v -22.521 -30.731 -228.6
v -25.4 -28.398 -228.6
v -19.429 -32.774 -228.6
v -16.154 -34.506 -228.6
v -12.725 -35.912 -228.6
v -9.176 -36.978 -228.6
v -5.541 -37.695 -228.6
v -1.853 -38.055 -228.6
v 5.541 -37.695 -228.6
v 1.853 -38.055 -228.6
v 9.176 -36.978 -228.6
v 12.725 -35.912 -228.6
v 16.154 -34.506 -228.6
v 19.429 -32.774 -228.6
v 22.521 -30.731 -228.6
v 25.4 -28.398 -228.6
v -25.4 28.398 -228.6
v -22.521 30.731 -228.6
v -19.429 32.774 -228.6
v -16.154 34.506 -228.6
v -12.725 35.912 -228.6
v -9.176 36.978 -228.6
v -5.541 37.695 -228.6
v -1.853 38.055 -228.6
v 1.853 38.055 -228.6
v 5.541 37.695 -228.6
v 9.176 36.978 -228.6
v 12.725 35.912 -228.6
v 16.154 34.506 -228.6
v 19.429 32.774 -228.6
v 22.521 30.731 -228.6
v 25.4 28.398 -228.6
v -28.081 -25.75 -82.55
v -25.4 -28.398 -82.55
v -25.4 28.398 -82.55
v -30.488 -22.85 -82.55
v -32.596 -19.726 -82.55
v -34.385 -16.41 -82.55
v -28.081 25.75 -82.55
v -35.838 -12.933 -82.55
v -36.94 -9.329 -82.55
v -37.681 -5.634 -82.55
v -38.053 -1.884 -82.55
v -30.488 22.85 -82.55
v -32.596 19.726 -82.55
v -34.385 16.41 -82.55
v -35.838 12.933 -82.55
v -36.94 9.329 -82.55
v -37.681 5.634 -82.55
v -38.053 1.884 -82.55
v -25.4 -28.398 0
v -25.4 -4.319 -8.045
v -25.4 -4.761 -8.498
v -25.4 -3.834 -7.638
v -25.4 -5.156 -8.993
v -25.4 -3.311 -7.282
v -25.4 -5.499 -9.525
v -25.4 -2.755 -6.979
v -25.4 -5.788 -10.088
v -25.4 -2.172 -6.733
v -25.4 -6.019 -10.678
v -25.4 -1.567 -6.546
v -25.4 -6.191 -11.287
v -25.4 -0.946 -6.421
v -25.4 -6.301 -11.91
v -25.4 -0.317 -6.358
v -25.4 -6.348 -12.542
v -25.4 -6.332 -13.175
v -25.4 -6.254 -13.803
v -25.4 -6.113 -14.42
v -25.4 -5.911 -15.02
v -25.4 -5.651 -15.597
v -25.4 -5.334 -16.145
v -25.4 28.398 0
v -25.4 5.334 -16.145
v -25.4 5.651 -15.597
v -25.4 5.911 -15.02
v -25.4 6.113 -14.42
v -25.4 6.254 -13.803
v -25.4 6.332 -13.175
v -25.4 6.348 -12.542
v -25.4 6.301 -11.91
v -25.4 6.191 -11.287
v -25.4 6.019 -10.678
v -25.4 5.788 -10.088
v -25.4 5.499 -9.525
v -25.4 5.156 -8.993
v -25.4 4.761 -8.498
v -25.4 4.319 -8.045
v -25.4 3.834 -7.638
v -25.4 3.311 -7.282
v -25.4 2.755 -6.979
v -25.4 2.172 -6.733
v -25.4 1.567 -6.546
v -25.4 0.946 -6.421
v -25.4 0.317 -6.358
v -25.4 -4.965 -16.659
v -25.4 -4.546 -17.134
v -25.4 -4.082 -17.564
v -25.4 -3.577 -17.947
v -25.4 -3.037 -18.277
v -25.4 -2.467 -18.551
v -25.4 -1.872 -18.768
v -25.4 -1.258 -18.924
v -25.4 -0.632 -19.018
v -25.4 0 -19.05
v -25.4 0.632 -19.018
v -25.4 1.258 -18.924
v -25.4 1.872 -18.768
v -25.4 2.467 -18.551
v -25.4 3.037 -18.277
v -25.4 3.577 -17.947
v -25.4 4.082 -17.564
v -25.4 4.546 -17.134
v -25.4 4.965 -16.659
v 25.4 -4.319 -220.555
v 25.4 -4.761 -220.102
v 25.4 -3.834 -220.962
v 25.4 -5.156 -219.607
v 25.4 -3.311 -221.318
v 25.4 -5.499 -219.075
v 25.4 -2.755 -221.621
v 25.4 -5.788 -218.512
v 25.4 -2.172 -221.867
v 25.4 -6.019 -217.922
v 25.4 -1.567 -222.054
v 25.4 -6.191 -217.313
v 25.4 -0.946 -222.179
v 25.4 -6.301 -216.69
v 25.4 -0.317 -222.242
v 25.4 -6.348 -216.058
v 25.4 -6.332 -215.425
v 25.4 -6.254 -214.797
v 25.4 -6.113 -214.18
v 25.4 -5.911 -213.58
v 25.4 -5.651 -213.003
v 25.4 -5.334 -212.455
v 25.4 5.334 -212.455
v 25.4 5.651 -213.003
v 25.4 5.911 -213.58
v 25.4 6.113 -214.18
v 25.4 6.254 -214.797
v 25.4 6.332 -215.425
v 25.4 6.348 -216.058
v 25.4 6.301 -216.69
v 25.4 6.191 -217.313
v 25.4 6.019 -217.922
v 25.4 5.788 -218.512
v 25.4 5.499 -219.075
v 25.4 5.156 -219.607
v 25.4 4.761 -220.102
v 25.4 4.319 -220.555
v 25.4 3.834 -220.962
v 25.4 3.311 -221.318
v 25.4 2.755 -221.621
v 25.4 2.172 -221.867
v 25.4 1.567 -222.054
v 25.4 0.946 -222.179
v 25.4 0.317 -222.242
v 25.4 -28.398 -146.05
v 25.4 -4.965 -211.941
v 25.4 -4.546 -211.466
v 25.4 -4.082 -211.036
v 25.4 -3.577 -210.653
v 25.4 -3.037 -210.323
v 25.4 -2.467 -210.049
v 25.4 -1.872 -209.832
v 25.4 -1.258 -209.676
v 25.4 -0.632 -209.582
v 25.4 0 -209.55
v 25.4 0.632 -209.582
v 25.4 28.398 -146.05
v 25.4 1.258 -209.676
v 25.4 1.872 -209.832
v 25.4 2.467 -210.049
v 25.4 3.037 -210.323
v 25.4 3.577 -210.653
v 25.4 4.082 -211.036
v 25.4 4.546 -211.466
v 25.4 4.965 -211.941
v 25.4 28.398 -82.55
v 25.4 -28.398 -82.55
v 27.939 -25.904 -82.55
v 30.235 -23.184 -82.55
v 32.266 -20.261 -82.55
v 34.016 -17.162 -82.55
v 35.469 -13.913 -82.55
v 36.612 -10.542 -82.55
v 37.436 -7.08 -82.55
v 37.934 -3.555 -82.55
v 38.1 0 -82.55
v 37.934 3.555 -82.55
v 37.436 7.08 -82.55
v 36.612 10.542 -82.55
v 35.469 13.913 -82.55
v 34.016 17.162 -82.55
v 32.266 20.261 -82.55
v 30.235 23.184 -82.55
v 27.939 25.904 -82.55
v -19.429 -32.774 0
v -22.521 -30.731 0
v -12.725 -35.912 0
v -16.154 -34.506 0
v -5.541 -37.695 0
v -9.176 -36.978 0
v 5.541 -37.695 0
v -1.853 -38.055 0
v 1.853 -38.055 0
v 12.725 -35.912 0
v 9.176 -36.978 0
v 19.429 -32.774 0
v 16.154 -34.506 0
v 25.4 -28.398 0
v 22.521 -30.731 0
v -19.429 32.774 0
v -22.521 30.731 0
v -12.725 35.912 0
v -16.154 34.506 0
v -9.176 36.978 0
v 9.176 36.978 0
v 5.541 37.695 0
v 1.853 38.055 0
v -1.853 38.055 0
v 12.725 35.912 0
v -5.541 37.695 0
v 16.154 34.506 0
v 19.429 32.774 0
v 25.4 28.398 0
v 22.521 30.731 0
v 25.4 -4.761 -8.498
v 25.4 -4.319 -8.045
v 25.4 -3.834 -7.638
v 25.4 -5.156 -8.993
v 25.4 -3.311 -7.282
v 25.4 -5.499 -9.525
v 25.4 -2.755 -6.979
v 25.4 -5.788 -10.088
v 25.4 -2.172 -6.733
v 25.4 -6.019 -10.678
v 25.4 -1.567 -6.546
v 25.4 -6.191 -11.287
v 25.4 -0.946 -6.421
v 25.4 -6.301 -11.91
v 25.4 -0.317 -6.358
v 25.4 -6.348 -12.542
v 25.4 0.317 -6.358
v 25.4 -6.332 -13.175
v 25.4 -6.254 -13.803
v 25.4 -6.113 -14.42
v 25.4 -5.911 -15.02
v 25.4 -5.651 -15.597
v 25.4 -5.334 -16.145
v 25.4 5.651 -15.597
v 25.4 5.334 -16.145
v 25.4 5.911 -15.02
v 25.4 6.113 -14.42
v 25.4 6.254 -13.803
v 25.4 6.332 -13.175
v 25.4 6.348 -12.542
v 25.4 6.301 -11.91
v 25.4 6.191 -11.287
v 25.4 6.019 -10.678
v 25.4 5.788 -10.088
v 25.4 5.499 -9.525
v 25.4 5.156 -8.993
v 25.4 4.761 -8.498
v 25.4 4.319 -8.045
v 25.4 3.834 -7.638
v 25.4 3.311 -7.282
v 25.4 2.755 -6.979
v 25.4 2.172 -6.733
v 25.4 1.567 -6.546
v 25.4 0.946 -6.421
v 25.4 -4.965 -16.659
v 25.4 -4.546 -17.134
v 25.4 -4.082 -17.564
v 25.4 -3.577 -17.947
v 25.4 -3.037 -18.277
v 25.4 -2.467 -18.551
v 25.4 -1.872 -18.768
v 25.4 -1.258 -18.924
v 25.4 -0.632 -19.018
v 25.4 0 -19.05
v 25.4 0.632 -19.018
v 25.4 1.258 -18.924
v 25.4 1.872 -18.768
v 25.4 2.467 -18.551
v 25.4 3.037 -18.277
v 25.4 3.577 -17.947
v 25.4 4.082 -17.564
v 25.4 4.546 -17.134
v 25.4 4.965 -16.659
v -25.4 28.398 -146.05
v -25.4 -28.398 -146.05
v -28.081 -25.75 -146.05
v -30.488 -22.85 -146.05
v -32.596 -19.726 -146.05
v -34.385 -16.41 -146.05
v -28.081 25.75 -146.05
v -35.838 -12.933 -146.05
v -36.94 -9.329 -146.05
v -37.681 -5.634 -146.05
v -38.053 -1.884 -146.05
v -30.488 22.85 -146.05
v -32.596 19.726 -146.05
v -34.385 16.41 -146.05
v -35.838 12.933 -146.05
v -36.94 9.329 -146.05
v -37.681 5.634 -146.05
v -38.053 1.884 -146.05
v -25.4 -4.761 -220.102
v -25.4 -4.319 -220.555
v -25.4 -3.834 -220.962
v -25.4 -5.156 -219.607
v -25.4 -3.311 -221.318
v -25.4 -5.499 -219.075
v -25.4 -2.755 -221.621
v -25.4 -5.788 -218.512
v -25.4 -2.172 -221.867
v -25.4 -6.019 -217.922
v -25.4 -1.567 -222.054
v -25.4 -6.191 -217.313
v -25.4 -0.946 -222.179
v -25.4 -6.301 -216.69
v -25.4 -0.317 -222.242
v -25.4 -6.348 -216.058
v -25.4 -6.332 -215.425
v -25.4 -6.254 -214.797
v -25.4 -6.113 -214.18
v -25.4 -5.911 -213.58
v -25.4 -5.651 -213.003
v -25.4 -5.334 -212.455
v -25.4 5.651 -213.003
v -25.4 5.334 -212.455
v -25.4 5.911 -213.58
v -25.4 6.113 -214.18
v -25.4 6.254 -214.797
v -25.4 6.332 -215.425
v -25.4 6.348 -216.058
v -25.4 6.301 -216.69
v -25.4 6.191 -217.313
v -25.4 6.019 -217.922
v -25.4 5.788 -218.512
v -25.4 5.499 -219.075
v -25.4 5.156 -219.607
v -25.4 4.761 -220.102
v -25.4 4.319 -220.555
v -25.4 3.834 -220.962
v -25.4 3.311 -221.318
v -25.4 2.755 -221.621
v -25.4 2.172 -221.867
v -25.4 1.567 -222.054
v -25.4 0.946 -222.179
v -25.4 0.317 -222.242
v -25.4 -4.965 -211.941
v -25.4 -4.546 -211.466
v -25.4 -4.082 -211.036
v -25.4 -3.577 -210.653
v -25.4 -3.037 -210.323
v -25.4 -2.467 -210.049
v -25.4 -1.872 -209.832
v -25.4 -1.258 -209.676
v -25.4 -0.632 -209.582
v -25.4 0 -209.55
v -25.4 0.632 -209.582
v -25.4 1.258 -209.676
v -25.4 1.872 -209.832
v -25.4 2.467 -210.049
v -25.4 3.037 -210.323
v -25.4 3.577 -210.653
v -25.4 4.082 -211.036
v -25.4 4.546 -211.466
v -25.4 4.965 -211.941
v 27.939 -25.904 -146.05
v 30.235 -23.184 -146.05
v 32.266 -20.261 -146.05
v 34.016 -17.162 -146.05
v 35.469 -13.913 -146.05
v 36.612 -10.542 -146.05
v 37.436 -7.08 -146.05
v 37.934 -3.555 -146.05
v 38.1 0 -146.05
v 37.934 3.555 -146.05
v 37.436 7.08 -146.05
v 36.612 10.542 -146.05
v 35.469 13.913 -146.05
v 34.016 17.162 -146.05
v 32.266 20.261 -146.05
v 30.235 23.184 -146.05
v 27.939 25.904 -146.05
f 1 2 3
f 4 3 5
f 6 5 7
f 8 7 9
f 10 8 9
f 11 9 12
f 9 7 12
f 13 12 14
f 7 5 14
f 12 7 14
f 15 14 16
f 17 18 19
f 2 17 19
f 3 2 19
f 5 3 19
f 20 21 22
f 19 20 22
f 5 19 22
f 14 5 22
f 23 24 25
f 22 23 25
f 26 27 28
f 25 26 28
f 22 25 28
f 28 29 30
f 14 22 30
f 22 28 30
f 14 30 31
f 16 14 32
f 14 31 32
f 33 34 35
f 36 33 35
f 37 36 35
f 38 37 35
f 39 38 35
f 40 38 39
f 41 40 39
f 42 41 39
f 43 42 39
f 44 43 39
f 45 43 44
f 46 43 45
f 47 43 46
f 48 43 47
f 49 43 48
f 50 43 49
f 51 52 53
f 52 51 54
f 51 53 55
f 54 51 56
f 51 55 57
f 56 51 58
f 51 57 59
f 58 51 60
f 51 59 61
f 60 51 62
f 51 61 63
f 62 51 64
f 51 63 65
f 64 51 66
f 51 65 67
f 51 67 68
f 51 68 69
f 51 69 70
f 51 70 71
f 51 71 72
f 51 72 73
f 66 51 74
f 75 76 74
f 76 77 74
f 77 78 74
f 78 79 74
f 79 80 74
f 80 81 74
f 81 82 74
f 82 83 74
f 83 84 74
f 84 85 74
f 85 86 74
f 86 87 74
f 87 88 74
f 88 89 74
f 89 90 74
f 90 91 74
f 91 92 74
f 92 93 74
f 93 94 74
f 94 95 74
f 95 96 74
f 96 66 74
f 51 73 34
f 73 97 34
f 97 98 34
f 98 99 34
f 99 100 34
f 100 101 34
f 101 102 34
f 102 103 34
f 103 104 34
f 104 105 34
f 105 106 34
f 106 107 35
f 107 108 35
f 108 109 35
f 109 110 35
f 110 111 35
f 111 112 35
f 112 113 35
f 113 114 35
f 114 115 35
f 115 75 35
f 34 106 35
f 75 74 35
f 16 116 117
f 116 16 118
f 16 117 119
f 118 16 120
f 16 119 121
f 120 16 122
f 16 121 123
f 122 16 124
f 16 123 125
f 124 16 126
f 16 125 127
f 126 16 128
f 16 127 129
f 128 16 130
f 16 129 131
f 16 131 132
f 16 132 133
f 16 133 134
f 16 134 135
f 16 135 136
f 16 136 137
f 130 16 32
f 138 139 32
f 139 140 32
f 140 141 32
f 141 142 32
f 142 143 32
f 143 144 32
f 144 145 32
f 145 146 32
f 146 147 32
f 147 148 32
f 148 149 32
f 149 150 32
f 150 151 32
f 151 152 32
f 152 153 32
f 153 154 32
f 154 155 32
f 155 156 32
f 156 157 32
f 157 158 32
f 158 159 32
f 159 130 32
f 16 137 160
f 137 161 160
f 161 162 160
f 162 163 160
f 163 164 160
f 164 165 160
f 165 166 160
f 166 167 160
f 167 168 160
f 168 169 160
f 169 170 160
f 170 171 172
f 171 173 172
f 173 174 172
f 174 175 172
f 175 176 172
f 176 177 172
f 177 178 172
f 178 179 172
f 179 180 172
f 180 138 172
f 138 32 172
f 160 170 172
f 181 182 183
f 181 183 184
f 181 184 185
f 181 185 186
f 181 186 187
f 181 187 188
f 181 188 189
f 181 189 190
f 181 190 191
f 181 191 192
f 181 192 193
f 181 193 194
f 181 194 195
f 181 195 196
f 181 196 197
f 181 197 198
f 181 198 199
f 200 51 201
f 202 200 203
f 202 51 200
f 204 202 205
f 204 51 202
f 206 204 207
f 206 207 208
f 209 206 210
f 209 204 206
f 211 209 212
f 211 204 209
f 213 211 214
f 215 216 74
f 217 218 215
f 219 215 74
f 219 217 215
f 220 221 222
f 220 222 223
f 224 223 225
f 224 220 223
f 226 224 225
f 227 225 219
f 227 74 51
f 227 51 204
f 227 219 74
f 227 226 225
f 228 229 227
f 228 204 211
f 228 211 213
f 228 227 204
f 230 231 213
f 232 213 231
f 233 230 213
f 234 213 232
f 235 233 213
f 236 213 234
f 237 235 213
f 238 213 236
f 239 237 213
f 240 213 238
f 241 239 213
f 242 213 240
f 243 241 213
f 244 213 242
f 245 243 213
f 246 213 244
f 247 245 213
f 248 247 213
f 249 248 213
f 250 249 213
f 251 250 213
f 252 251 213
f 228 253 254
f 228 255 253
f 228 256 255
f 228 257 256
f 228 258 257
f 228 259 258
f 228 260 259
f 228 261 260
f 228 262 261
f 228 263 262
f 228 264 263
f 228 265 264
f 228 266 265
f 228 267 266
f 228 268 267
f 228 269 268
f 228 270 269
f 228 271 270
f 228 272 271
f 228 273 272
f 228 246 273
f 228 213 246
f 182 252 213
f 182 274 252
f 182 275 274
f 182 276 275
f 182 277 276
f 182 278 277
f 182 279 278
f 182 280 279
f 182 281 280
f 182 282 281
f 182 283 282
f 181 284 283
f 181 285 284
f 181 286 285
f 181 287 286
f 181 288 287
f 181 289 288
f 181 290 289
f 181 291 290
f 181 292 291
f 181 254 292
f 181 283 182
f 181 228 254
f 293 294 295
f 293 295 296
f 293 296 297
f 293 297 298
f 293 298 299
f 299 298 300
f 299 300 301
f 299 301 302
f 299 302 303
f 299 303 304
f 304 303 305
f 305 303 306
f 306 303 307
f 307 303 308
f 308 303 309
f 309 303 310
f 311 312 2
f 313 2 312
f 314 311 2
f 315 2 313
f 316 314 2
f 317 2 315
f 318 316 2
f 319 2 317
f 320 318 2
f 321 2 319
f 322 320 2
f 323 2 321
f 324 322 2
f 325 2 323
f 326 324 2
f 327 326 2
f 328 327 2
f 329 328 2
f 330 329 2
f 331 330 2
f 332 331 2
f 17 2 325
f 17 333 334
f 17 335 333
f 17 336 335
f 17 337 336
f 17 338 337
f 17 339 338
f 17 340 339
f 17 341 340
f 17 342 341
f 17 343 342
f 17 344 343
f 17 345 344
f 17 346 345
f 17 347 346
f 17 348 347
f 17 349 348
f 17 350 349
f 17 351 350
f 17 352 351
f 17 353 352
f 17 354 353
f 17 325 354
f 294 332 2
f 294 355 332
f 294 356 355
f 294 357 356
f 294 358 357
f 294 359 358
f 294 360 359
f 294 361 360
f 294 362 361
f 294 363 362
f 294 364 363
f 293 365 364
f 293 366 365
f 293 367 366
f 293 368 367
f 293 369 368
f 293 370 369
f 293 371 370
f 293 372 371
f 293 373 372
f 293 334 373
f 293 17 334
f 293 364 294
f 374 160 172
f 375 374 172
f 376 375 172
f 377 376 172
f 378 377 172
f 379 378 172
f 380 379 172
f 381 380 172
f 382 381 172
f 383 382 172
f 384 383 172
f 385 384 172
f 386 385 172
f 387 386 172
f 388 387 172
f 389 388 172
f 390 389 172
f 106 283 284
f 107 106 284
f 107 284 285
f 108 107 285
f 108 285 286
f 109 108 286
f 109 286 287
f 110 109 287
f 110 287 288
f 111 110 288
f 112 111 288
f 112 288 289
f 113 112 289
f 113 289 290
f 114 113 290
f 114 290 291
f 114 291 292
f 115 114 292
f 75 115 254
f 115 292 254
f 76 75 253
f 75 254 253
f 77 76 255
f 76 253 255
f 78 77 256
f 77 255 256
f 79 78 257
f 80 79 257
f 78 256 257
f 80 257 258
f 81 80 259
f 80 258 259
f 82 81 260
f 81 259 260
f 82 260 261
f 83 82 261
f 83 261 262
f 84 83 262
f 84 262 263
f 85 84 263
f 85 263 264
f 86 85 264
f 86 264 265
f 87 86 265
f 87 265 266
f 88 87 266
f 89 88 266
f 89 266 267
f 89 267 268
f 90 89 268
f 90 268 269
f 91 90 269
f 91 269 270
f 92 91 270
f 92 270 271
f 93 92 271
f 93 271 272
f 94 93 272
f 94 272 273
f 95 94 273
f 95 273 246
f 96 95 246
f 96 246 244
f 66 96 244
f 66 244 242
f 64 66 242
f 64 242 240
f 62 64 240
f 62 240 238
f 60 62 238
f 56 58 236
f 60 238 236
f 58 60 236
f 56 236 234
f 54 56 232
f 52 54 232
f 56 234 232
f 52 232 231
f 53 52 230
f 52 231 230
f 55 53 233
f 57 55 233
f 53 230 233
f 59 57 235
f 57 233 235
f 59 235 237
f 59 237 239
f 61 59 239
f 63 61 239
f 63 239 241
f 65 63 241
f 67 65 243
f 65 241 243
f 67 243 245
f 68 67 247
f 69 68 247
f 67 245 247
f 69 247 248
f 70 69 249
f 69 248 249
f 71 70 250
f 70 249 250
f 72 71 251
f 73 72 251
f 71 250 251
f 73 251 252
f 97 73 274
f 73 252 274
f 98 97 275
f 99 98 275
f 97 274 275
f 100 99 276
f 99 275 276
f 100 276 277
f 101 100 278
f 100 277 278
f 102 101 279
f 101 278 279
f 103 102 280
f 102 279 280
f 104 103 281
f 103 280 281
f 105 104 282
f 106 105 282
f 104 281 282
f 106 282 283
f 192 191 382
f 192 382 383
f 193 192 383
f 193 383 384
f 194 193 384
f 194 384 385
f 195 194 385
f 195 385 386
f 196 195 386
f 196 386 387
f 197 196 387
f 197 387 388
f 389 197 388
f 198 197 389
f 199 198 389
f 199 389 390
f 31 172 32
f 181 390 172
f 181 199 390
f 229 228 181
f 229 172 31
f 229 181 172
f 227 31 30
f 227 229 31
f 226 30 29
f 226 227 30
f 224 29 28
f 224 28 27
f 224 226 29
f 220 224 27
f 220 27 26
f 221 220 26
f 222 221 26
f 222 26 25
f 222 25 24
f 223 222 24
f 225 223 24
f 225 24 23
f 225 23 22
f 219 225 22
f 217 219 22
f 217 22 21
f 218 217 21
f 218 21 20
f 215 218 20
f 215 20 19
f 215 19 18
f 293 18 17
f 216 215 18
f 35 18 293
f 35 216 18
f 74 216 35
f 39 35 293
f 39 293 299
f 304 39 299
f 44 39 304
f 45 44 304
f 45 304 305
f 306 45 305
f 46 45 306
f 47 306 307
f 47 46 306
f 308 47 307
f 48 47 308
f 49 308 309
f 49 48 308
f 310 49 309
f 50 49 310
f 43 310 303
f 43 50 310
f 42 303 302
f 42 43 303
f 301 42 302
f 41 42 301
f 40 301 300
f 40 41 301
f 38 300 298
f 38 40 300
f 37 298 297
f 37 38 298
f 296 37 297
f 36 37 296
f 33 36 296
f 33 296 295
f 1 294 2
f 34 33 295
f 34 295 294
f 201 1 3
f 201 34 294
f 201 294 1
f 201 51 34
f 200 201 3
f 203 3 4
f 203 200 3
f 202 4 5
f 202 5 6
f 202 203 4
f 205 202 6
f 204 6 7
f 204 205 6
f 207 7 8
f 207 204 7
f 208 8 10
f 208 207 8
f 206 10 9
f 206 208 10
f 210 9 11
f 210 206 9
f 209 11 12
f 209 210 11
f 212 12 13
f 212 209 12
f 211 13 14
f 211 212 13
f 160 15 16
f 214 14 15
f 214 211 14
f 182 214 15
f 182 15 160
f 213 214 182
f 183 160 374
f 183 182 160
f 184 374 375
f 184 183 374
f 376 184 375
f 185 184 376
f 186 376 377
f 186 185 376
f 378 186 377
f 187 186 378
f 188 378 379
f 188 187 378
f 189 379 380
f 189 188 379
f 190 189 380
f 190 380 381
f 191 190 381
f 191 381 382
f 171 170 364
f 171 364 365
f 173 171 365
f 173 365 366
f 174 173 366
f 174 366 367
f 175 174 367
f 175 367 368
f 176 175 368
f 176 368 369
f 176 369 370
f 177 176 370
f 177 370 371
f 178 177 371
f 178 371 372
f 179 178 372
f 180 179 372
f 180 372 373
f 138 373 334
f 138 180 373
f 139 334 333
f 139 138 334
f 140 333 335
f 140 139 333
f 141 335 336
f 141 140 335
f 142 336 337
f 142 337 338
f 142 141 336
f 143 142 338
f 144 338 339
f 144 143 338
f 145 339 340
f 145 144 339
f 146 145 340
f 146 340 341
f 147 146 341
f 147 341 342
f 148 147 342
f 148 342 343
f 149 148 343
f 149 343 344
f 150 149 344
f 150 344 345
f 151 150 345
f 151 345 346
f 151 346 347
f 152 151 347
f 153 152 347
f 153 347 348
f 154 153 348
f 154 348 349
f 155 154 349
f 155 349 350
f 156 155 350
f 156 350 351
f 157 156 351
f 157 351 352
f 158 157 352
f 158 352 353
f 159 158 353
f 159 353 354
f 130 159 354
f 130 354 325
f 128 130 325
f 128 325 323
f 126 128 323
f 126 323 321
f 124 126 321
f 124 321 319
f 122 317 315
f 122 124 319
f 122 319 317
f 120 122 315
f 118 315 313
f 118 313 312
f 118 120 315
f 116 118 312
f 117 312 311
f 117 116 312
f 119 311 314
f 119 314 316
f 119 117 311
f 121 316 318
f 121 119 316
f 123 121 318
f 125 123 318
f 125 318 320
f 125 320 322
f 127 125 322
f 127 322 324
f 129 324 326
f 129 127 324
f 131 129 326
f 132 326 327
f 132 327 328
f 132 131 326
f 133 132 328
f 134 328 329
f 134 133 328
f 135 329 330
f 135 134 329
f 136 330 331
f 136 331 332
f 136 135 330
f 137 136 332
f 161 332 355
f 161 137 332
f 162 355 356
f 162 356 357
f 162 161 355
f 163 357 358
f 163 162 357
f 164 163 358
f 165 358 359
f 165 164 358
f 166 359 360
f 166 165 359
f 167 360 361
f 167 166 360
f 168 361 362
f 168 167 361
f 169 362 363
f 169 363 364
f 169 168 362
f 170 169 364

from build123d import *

# Parameters (mm, degrees)
SKETCH2_R           = 38.1
BOSS_EXTRUDE1_DEPTH = 228.6
CUT_EXTRUDE1_START  = 25.4
SKETCH3_W           = 165.1
SKETCH3_H           = 76.2
CUT_EXTRUDE1_DEPTH  = 25.4
CUT_EXTRUDE2_START  = -25.4
SKETCH3_2_W         = 165.1
SKETCH3_2_H         = 76.2
CUT_EXTRUDE2_DEPTH  = 25.4
CUT_EXTRUDE3_REACH  = 242.295
SKETCH4_R           = 6.35


with BuildPart() as part:
    # Sketch2 → Boss-Extrude1 (new body)
    with BuildSketch(Plane.XY):
        Circle(SKETCH2_R)
    extrude(amount=-BOSS_EXTRUDE1_DEPTH)

    # Sketch3 → Cut-Extrude1 (cut)
    with BuildSketch(Plane(origin=(0, 0, 0), x_dir=(0, 0, -1), z_dir=(1, 0, 0)).offset(CUT_EXTRUDE1_START)):
        Rectangle(SKETCH3_W, SKETCH3_H)
    cut_extrude1 = extrude(amount=CUT_EXTRUDE1_DEPTH, mode=Mode.SUBTRACT)

    # Sketch3<2> → Cut-Extrude2 (cut)
    with BuildSketch(Plane(origin=(0, 0, 0), x_dir=(0, 0, -1), z_dir=(1, 0, 0)).offset(CUT_EXTRUDE2_START)):
        Rectangle(SKETCH3_2_W, SKETCH3_2_H)
    cut_extrude2 = extrude(amount=-CUT_EXTRUDE2_DEPTH, mode=Mode.SUBTRACT)

    # Sketch4 → Cut-Extrude3 (cut, up to next)
    with BuildSketch(Plane(origin=(25.4, 0, 0), x_dir=(0, 0, -1), z_dir=(1, 0, 0)), mode=Mode.PRIVATE) as cut_extrude3_sk1:
        with Locations((12.7, 0)):
            Circle(SKETCH4_R)
    cut_extrude3_tool1 = extrude(cut_extrude3_sk1.sketch, amount=-CUT_EXTRUDE3_REACH, mode=Mode.PRIVATE) & part.part
    cut_extrude3 = cut_extrude3_tool1.solids().sort_by_distance((25.4, 0, -12.7))[0]
    add(cut_extrude3, mode=Mode.SUBTRACT)

    # Mirror1: Cut-Extrude1, Cut-Extrude2, Cut-Extrude3 across plane
    add(cut_extrude1.mirror(Plane.XY.offset(-114.3)), mode=Mode.SUBTRACT)
    add(cut_extrude2.mirror(Plane.XY.offset(-114.3)), mode=Mode.SUBTRACT)
    add(cut_extrude3.mirror(Plane.XY.offset(-114.3)), mode=Mode.SUBTRACT)


solid = part.part
